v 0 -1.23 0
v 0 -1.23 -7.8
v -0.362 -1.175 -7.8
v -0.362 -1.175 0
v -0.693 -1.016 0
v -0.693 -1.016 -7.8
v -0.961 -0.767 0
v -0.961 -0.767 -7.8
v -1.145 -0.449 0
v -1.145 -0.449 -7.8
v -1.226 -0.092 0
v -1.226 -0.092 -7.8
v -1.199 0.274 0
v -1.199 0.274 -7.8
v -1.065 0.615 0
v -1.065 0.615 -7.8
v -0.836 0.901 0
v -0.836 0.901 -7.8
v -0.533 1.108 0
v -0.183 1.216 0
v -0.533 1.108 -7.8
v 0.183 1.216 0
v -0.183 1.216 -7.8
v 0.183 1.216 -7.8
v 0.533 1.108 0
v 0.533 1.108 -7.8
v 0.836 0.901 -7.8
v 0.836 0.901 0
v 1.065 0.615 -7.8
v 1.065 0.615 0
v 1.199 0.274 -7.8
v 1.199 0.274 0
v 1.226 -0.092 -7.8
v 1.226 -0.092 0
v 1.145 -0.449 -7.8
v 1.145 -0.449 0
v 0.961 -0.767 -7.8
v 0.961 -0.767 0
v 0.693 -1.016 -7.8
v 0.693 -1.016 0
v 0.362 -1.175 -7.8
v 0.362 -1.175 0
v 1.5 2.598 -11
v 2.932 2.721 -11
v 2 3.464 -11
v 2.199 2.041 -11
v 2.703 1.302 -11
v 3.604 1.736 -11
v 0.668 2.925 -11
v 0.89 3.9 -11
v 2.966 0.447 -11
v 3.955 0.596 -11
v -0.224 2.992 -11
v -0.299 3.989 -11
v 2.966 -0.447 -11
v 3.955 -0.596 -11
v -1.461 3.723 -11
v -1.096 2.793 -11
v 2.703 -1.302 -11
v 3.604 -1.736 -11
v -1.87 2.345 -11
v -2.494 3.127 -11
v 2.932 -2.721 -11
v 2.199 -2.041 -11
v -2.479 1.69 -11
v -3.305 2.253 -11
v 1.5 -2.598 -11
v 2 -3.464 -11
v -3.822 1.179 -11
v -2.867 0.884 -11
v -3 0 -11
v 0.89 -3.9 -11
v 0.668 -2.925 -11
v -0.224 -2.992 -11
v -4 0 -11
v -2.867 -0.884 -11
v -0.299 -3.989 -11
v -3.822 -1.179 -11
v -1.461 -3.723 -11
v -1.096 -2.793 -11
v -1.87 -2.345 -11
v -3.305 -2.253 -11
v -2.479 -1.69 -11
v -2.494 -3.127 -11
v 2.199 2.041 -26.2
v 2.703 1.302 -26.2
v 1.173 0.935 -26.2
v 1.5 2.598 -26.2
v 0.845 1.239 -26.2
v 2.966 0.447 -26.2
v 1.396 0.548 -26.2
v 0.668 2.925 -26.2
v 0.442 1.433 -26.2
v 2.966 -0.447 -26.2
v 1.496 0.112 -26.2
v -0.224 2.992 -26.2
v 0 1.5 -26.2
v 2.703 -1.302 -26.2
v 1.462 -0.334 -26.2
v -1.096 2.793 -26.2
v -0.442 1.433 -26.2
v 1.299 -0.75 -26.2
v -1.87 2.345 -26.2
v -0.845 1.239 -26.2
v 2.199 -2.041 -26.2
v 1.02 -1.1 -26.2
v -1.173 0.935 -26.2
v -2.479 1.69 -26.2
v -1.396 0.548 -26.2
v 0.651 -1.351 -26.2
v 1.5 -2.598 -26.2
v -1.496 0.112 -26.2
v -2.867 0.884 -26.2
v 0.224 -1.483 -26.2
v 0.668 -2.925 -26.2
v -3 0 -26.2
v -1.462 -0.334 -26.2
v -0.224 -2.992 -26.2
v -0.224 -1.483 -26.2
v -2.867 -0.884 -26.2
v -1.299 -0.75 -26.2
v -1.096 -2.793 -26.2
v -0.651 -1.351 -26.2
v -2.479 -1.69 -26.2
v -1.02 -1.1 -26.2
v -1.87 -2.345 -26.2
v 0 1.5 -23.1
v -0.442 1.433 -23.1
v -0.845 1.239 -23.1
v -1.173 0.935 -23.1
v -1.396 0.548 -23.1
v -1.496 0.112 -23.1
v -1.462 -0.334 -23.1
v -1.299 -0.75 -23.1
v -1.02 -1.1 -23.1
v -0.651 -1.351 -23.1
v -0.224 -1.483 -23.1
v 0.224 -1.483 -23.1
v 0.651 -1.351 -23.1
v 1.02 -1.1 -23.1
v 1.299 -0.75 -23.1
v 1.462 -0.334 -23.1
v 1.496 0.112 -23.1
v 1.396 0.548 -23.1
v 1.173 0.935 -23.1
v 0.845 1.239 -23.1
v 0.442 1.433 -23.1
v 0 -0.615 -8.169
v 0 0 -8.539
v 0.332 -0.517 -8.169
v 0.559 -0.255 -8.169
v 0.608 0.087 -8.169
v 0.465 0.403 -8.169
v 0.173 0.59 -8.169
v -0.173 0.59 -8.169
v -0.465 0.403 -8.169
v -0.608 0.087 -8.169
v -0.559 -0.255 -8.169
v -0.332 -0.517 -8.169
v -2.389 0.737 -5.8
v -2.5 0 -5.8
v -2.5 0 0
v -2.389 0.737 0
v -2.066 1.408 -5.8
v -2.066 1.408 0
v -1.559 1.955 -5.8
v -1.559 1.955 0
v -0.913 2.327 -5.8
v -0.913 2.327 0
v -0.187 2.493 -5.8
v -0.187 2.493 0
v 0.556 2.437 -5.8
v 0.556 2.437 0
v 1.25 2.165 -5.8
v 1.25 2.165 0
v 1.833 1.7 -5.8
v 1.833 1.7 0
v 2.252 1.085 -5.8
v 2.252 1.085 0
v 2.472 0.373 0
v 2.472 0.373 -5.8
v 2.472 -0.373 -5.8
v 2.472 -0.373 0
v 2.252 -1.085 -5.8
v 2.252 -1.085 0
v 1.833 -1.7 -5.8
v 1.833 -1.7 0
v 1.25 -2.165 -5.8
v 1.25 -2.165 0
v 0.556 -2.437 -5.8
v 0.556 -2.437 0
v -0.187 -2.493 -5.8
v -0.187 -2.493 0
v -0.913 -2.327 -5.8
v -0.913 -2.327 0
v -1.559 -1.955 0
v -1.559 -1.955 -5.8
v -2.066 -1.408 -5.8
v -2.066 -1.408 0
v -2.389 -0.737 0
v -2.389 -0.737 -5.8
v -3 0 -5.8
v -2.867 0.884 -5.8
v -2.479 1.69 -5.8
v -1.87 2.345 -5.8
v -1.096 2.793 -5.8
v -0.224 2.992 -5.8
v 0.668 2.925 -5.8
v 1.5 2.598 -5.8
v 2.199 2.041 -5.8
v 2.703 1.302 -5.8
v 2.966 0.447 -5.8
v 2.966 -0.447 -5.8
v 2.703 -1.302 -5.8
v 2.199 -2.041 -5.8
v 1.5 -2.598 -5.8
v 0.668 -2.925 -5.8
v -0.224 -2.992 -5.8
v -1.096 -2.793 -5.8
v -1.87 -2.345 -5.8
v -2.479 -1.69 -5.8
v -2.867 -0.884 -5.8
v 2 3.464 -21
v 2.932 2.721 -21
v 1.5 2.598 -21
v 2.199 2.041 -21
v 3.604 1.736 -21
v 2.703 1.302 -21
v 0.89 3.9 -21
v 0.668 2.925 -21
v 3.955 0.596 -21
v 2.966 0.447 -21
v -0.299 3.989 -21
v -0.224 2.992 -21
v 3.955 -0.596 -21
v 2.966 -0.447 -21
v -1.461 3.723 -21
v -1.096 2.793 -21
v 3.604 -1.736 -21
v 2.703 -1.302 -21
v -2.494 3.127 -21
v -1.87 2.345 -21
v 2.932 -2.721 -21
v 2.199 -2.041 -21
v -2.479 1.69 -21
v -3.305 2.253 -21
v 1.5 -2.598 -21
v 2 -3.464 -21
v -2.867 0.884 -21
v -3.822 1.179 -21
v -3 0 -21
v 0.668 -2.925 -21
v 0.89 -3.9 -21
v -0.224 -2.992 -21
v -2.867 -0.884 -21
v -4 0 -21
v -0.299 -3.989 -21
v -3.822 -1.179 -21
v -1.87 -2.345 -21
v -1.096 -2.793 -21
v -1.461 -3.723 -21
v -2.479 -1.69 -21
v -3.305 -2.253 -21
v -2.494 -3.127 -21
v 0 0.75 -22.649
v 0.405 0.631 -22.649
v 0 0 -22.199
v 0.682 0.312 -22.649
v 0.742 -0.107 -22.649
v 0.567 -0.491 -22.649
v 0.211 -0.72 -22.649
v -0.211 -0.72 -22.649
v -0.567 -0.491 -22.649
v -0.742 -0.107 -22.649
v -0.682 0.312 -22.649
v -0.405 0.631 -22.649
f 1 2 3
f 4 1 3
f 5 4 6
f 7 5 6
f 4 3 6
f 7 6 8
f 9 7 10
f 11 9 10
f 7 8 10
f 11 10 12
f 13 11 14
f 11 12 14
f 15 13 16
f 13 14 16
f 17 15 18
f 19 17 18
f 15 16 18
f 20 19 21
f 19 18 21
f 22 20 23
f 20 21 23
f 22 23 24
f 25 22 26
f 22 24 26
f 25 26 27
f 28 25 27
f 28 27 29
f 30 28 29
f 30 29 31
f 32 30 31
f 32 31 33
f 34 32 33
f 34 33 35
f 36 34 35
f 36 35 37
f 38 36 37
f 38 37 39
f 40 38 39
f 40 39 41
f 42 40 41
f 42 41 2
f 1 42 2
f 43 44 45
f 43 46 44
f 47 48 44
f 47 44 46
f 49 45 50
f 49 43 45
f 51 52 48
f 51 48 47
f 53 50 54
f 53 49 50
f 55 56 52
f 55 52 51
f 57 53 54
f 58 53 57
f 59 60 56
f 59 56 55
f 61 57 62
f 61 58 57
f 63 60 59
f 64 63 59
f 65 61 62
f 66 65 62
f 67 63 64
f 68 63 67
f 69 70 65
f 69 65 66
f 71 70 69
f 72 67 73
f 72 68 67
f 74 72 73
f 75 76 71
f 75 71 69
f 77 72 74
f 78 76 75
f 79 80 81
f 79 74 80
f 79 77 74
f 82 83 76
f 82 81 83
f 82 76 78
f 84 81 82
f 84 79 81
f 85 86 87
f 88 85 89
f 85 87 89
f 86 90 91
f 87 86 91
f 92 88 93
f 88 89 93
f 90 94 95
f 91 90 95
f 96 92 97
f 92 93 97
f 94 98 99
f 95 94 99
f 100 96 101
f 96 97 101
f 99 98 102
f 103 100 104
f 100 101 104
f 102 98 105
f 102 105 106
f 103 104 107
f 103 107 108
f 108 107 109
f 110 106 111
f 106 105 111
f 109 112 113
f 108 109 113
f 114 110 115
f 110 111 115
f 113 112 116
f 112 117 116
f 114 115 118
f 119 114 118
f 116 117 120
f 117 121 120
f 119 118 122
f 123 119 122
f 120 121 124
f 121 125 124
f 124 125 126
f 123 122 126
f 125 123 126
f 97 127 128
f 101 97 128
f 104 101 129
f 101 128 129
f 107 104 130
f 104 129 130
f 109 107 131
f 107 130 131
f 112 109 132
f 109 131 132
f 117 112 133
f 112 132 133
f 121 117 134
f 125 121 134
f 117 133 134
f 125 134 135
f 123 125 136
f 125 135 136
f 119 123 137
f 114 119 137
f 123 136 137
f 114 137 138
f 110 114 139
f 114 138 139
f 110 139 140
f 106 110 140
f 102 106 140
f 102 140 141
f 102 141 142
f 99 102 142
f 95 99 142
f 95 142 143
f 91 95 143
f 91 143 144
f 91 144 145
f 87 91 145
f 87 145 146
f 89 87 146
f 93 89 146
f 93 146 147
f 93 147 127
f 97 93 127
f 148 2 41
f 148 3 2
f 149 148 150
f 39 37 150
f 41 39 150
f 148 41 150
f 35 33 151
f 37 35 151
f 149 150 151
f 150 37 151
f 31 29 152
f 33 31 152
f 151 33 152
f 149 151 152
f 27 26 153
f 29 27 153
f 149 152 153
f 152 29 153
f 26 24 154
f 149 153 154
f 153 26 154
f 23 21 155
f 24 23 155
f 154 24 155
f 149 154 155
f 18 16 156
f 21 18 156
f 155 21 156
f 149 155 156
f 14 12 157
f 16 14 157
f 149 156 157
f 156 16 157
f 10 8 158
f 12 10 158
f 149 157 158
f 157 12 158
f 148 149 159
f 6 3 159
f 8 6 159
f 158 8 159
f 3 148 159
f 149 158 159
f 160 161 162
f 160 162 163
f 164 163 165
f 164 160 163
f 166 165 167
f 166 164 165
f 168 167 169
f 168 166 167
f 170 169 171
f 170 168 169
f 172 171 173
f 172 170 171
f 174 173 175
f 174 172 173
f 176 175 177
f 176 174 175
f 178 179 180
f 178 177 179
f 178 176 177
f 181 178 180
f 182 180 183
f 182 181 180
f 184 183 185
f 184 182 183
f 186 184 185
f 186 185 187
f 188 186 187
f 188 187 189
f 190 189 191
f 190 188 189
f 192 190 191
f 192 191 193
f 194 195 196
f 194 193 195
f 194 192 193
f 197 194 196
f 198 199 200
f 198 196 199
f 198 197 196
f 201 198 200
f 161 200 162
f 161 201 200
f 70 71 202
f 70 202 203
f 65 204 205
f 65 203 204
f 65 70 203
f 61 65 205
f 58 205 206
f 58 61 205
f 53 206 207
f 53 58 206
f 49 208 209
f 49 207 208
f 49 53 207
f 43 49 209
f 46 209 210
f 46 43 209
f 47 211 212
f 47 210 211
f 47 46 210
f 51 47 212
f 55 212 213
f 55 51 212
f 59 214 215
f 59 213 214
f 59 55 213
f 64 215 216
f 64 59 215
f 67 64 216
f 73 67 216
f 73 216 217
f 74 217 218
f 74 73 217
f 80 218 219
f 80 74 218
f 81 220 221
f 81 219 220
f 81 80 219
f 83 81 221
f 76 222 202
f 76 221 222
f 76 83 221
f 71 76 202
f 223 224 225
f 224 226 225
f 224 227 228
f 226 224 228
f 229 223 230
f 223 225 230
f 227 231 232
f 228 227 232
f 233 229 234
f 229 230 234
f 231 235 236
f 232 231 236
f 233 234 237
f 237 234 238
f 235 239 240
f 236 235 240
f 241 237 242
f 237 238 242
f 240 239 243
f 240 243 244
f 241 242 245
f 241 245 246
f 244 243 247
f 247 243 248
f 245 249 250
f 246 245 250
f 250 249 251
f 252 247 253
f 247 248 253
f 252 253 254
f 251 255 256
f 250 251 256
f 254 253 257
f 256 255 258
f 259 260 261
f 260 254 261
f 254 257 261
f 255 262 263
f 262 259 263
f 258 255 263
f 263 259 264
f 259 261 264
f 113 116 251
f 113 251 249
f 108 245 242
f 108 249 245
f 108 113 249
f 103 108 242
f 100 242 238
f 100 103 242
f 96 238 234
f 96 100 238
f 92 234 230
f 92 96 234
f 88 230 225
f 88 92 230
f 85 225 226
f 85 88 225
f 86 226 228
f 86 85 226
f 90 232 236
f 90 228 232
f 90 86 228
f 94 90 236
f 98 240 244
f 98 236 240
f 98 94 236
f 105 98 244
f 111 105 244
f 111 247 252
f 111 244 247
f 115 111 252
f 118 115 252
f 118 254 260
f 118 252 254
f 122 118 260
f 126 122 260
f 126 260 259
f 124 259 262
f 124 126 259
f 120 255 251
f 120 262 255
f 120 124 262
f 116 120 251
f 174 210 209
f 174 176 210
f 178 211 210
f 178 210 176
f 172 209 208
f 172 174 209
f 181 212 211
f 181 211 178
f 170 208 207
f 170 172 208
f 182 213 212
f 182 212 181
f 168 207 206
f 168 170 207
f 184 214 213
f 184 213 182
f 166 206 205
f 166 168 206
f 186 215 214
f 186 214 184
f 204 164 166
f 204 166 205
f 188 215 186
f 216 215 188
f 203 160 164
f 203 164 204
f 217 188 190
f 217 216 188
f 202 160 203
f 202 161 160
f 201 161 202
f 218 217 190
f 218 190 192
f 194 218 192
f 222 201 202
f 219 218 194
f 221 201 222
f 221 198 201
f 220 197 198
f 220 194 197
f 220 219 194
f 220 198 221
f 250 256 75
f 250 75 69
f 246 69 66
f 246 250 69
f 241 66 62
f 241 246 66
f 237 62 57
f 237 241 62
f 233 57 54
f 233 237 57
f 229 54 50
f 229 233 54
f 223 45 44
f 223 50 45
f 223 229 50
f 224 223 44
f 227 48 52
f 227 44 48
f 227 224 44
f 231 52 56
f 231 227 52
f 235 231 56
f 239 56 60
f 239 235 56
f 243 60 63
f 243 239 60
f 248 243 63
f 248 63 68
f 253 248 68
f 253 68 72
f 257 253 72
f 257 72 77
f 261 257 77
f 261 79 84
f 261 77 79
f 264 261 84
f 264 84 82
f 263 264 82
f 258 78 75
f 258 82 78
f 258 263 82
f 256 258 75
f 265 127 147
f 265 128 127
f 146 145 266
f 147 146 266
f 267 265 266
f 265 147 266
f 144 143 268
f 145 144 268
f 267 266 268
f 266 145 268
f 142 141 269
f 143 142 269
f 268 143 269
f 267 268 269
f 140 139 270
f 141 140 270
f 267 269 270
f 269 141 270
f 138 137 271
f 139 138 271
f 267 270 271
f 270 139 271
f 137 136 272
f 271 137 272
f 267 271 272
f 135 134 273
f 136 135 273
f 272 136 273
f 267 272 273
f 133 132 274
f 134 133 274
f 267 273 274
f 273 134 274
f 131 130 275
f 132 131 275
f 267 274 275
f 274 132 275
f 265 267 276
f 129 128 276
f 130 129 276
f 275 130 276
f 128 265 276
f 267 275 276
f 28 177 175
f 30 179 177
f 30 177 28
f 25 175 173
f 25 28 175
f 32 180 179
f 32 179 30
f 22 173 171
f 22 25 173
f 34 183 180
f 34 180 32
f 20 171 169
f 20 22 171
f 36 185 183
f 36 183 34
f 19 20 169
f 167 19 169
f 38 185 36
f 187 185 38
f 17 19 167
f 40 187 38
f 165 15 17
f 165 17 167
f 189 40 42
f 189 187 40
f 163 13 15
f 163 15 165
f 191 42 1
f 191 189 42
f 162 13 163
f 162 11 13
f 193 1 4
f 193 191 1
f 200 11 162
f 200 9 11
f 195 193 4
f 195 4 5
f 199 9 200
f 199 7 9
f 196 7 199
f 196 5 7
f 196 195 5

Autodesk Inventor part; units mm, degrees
ref_plane "YZ Plane" through (0, 0, 0) normal (1, 0, 0) x (0, 1, 0)
ref_plane "XZ Plane" through (0, 0, 0) normal (0, 1, 0) x (-1, 0, 0)
ref_plane "XY Plane" through (0, 0, 0) normal (0, 0, 1) x (1, 0, 0)
sketch "Sketch1" plane through (0, 0, 0) normal (0, 1, 0) x (-1, 0, 0)
  line L0 (0, 0) -> (2.5, 0)
  line L1 (2.5, 0) -> (2.5, -26.2)
  line L2 (2.5, -26.2) -> (0, -26.2)
  line L3 (0, -26.2) -> (0, 0)
  line L4 (2.5, -5.8) -> (3, -5.8)
  line L5 (3, -5.8) -> (3, -11)
  line L6 (3, -11) -> (4, -11)
  line L7 (4, -11) -> (4, -21)
  line L8 (4, -21) -> (3, -21)
  line L9 (3, -21) -> (3, -26.2)
  line L10 (3, -26.2) -> (2.5, -26.2)
  dimension "d0" = 5
  dimension "d10" = 6
  dimension "d11" = 5.8
  dimension "d12" = 8
  dimension "d13" = 5.2
  dimension "d14" = 5.2
  dimension "d15" = 10
revolve "Revolution1" add sketch "Sketch1" angle 360 about axis through (0, 0, -26.2) along (0, 0, 1)
sketch "Sketch2" plane through (0, 0, 0) normal (0, 0, 1) x (1, 0, 0)
  point P0 (0, 0)
  point P1 (0, 0)
hole "Hole1" at (0, 0, 0) direction (0, 0, -1) diameter 2.459 depth 7.8 tip angle 118 thread size "M3x0.5" class "6H" standard "ISO Metric profile"
sketch "Sketch3" plane through (0, 0, -26.2) normal (0, 0, -1) x (-1, 0, 0)
  circle A0 centre (0, 0) radius 1.2295 projected
  point P0 (0, 0)
hole "Hole2" at (0, 0, -26.2) direction (0, 0, 1) diameter 3 depth 3.1 tip angle 118
equation "\"d14\" = d13"
properties part number "TorquimeterShaft" material "Stainless Steel, Austenitic"
